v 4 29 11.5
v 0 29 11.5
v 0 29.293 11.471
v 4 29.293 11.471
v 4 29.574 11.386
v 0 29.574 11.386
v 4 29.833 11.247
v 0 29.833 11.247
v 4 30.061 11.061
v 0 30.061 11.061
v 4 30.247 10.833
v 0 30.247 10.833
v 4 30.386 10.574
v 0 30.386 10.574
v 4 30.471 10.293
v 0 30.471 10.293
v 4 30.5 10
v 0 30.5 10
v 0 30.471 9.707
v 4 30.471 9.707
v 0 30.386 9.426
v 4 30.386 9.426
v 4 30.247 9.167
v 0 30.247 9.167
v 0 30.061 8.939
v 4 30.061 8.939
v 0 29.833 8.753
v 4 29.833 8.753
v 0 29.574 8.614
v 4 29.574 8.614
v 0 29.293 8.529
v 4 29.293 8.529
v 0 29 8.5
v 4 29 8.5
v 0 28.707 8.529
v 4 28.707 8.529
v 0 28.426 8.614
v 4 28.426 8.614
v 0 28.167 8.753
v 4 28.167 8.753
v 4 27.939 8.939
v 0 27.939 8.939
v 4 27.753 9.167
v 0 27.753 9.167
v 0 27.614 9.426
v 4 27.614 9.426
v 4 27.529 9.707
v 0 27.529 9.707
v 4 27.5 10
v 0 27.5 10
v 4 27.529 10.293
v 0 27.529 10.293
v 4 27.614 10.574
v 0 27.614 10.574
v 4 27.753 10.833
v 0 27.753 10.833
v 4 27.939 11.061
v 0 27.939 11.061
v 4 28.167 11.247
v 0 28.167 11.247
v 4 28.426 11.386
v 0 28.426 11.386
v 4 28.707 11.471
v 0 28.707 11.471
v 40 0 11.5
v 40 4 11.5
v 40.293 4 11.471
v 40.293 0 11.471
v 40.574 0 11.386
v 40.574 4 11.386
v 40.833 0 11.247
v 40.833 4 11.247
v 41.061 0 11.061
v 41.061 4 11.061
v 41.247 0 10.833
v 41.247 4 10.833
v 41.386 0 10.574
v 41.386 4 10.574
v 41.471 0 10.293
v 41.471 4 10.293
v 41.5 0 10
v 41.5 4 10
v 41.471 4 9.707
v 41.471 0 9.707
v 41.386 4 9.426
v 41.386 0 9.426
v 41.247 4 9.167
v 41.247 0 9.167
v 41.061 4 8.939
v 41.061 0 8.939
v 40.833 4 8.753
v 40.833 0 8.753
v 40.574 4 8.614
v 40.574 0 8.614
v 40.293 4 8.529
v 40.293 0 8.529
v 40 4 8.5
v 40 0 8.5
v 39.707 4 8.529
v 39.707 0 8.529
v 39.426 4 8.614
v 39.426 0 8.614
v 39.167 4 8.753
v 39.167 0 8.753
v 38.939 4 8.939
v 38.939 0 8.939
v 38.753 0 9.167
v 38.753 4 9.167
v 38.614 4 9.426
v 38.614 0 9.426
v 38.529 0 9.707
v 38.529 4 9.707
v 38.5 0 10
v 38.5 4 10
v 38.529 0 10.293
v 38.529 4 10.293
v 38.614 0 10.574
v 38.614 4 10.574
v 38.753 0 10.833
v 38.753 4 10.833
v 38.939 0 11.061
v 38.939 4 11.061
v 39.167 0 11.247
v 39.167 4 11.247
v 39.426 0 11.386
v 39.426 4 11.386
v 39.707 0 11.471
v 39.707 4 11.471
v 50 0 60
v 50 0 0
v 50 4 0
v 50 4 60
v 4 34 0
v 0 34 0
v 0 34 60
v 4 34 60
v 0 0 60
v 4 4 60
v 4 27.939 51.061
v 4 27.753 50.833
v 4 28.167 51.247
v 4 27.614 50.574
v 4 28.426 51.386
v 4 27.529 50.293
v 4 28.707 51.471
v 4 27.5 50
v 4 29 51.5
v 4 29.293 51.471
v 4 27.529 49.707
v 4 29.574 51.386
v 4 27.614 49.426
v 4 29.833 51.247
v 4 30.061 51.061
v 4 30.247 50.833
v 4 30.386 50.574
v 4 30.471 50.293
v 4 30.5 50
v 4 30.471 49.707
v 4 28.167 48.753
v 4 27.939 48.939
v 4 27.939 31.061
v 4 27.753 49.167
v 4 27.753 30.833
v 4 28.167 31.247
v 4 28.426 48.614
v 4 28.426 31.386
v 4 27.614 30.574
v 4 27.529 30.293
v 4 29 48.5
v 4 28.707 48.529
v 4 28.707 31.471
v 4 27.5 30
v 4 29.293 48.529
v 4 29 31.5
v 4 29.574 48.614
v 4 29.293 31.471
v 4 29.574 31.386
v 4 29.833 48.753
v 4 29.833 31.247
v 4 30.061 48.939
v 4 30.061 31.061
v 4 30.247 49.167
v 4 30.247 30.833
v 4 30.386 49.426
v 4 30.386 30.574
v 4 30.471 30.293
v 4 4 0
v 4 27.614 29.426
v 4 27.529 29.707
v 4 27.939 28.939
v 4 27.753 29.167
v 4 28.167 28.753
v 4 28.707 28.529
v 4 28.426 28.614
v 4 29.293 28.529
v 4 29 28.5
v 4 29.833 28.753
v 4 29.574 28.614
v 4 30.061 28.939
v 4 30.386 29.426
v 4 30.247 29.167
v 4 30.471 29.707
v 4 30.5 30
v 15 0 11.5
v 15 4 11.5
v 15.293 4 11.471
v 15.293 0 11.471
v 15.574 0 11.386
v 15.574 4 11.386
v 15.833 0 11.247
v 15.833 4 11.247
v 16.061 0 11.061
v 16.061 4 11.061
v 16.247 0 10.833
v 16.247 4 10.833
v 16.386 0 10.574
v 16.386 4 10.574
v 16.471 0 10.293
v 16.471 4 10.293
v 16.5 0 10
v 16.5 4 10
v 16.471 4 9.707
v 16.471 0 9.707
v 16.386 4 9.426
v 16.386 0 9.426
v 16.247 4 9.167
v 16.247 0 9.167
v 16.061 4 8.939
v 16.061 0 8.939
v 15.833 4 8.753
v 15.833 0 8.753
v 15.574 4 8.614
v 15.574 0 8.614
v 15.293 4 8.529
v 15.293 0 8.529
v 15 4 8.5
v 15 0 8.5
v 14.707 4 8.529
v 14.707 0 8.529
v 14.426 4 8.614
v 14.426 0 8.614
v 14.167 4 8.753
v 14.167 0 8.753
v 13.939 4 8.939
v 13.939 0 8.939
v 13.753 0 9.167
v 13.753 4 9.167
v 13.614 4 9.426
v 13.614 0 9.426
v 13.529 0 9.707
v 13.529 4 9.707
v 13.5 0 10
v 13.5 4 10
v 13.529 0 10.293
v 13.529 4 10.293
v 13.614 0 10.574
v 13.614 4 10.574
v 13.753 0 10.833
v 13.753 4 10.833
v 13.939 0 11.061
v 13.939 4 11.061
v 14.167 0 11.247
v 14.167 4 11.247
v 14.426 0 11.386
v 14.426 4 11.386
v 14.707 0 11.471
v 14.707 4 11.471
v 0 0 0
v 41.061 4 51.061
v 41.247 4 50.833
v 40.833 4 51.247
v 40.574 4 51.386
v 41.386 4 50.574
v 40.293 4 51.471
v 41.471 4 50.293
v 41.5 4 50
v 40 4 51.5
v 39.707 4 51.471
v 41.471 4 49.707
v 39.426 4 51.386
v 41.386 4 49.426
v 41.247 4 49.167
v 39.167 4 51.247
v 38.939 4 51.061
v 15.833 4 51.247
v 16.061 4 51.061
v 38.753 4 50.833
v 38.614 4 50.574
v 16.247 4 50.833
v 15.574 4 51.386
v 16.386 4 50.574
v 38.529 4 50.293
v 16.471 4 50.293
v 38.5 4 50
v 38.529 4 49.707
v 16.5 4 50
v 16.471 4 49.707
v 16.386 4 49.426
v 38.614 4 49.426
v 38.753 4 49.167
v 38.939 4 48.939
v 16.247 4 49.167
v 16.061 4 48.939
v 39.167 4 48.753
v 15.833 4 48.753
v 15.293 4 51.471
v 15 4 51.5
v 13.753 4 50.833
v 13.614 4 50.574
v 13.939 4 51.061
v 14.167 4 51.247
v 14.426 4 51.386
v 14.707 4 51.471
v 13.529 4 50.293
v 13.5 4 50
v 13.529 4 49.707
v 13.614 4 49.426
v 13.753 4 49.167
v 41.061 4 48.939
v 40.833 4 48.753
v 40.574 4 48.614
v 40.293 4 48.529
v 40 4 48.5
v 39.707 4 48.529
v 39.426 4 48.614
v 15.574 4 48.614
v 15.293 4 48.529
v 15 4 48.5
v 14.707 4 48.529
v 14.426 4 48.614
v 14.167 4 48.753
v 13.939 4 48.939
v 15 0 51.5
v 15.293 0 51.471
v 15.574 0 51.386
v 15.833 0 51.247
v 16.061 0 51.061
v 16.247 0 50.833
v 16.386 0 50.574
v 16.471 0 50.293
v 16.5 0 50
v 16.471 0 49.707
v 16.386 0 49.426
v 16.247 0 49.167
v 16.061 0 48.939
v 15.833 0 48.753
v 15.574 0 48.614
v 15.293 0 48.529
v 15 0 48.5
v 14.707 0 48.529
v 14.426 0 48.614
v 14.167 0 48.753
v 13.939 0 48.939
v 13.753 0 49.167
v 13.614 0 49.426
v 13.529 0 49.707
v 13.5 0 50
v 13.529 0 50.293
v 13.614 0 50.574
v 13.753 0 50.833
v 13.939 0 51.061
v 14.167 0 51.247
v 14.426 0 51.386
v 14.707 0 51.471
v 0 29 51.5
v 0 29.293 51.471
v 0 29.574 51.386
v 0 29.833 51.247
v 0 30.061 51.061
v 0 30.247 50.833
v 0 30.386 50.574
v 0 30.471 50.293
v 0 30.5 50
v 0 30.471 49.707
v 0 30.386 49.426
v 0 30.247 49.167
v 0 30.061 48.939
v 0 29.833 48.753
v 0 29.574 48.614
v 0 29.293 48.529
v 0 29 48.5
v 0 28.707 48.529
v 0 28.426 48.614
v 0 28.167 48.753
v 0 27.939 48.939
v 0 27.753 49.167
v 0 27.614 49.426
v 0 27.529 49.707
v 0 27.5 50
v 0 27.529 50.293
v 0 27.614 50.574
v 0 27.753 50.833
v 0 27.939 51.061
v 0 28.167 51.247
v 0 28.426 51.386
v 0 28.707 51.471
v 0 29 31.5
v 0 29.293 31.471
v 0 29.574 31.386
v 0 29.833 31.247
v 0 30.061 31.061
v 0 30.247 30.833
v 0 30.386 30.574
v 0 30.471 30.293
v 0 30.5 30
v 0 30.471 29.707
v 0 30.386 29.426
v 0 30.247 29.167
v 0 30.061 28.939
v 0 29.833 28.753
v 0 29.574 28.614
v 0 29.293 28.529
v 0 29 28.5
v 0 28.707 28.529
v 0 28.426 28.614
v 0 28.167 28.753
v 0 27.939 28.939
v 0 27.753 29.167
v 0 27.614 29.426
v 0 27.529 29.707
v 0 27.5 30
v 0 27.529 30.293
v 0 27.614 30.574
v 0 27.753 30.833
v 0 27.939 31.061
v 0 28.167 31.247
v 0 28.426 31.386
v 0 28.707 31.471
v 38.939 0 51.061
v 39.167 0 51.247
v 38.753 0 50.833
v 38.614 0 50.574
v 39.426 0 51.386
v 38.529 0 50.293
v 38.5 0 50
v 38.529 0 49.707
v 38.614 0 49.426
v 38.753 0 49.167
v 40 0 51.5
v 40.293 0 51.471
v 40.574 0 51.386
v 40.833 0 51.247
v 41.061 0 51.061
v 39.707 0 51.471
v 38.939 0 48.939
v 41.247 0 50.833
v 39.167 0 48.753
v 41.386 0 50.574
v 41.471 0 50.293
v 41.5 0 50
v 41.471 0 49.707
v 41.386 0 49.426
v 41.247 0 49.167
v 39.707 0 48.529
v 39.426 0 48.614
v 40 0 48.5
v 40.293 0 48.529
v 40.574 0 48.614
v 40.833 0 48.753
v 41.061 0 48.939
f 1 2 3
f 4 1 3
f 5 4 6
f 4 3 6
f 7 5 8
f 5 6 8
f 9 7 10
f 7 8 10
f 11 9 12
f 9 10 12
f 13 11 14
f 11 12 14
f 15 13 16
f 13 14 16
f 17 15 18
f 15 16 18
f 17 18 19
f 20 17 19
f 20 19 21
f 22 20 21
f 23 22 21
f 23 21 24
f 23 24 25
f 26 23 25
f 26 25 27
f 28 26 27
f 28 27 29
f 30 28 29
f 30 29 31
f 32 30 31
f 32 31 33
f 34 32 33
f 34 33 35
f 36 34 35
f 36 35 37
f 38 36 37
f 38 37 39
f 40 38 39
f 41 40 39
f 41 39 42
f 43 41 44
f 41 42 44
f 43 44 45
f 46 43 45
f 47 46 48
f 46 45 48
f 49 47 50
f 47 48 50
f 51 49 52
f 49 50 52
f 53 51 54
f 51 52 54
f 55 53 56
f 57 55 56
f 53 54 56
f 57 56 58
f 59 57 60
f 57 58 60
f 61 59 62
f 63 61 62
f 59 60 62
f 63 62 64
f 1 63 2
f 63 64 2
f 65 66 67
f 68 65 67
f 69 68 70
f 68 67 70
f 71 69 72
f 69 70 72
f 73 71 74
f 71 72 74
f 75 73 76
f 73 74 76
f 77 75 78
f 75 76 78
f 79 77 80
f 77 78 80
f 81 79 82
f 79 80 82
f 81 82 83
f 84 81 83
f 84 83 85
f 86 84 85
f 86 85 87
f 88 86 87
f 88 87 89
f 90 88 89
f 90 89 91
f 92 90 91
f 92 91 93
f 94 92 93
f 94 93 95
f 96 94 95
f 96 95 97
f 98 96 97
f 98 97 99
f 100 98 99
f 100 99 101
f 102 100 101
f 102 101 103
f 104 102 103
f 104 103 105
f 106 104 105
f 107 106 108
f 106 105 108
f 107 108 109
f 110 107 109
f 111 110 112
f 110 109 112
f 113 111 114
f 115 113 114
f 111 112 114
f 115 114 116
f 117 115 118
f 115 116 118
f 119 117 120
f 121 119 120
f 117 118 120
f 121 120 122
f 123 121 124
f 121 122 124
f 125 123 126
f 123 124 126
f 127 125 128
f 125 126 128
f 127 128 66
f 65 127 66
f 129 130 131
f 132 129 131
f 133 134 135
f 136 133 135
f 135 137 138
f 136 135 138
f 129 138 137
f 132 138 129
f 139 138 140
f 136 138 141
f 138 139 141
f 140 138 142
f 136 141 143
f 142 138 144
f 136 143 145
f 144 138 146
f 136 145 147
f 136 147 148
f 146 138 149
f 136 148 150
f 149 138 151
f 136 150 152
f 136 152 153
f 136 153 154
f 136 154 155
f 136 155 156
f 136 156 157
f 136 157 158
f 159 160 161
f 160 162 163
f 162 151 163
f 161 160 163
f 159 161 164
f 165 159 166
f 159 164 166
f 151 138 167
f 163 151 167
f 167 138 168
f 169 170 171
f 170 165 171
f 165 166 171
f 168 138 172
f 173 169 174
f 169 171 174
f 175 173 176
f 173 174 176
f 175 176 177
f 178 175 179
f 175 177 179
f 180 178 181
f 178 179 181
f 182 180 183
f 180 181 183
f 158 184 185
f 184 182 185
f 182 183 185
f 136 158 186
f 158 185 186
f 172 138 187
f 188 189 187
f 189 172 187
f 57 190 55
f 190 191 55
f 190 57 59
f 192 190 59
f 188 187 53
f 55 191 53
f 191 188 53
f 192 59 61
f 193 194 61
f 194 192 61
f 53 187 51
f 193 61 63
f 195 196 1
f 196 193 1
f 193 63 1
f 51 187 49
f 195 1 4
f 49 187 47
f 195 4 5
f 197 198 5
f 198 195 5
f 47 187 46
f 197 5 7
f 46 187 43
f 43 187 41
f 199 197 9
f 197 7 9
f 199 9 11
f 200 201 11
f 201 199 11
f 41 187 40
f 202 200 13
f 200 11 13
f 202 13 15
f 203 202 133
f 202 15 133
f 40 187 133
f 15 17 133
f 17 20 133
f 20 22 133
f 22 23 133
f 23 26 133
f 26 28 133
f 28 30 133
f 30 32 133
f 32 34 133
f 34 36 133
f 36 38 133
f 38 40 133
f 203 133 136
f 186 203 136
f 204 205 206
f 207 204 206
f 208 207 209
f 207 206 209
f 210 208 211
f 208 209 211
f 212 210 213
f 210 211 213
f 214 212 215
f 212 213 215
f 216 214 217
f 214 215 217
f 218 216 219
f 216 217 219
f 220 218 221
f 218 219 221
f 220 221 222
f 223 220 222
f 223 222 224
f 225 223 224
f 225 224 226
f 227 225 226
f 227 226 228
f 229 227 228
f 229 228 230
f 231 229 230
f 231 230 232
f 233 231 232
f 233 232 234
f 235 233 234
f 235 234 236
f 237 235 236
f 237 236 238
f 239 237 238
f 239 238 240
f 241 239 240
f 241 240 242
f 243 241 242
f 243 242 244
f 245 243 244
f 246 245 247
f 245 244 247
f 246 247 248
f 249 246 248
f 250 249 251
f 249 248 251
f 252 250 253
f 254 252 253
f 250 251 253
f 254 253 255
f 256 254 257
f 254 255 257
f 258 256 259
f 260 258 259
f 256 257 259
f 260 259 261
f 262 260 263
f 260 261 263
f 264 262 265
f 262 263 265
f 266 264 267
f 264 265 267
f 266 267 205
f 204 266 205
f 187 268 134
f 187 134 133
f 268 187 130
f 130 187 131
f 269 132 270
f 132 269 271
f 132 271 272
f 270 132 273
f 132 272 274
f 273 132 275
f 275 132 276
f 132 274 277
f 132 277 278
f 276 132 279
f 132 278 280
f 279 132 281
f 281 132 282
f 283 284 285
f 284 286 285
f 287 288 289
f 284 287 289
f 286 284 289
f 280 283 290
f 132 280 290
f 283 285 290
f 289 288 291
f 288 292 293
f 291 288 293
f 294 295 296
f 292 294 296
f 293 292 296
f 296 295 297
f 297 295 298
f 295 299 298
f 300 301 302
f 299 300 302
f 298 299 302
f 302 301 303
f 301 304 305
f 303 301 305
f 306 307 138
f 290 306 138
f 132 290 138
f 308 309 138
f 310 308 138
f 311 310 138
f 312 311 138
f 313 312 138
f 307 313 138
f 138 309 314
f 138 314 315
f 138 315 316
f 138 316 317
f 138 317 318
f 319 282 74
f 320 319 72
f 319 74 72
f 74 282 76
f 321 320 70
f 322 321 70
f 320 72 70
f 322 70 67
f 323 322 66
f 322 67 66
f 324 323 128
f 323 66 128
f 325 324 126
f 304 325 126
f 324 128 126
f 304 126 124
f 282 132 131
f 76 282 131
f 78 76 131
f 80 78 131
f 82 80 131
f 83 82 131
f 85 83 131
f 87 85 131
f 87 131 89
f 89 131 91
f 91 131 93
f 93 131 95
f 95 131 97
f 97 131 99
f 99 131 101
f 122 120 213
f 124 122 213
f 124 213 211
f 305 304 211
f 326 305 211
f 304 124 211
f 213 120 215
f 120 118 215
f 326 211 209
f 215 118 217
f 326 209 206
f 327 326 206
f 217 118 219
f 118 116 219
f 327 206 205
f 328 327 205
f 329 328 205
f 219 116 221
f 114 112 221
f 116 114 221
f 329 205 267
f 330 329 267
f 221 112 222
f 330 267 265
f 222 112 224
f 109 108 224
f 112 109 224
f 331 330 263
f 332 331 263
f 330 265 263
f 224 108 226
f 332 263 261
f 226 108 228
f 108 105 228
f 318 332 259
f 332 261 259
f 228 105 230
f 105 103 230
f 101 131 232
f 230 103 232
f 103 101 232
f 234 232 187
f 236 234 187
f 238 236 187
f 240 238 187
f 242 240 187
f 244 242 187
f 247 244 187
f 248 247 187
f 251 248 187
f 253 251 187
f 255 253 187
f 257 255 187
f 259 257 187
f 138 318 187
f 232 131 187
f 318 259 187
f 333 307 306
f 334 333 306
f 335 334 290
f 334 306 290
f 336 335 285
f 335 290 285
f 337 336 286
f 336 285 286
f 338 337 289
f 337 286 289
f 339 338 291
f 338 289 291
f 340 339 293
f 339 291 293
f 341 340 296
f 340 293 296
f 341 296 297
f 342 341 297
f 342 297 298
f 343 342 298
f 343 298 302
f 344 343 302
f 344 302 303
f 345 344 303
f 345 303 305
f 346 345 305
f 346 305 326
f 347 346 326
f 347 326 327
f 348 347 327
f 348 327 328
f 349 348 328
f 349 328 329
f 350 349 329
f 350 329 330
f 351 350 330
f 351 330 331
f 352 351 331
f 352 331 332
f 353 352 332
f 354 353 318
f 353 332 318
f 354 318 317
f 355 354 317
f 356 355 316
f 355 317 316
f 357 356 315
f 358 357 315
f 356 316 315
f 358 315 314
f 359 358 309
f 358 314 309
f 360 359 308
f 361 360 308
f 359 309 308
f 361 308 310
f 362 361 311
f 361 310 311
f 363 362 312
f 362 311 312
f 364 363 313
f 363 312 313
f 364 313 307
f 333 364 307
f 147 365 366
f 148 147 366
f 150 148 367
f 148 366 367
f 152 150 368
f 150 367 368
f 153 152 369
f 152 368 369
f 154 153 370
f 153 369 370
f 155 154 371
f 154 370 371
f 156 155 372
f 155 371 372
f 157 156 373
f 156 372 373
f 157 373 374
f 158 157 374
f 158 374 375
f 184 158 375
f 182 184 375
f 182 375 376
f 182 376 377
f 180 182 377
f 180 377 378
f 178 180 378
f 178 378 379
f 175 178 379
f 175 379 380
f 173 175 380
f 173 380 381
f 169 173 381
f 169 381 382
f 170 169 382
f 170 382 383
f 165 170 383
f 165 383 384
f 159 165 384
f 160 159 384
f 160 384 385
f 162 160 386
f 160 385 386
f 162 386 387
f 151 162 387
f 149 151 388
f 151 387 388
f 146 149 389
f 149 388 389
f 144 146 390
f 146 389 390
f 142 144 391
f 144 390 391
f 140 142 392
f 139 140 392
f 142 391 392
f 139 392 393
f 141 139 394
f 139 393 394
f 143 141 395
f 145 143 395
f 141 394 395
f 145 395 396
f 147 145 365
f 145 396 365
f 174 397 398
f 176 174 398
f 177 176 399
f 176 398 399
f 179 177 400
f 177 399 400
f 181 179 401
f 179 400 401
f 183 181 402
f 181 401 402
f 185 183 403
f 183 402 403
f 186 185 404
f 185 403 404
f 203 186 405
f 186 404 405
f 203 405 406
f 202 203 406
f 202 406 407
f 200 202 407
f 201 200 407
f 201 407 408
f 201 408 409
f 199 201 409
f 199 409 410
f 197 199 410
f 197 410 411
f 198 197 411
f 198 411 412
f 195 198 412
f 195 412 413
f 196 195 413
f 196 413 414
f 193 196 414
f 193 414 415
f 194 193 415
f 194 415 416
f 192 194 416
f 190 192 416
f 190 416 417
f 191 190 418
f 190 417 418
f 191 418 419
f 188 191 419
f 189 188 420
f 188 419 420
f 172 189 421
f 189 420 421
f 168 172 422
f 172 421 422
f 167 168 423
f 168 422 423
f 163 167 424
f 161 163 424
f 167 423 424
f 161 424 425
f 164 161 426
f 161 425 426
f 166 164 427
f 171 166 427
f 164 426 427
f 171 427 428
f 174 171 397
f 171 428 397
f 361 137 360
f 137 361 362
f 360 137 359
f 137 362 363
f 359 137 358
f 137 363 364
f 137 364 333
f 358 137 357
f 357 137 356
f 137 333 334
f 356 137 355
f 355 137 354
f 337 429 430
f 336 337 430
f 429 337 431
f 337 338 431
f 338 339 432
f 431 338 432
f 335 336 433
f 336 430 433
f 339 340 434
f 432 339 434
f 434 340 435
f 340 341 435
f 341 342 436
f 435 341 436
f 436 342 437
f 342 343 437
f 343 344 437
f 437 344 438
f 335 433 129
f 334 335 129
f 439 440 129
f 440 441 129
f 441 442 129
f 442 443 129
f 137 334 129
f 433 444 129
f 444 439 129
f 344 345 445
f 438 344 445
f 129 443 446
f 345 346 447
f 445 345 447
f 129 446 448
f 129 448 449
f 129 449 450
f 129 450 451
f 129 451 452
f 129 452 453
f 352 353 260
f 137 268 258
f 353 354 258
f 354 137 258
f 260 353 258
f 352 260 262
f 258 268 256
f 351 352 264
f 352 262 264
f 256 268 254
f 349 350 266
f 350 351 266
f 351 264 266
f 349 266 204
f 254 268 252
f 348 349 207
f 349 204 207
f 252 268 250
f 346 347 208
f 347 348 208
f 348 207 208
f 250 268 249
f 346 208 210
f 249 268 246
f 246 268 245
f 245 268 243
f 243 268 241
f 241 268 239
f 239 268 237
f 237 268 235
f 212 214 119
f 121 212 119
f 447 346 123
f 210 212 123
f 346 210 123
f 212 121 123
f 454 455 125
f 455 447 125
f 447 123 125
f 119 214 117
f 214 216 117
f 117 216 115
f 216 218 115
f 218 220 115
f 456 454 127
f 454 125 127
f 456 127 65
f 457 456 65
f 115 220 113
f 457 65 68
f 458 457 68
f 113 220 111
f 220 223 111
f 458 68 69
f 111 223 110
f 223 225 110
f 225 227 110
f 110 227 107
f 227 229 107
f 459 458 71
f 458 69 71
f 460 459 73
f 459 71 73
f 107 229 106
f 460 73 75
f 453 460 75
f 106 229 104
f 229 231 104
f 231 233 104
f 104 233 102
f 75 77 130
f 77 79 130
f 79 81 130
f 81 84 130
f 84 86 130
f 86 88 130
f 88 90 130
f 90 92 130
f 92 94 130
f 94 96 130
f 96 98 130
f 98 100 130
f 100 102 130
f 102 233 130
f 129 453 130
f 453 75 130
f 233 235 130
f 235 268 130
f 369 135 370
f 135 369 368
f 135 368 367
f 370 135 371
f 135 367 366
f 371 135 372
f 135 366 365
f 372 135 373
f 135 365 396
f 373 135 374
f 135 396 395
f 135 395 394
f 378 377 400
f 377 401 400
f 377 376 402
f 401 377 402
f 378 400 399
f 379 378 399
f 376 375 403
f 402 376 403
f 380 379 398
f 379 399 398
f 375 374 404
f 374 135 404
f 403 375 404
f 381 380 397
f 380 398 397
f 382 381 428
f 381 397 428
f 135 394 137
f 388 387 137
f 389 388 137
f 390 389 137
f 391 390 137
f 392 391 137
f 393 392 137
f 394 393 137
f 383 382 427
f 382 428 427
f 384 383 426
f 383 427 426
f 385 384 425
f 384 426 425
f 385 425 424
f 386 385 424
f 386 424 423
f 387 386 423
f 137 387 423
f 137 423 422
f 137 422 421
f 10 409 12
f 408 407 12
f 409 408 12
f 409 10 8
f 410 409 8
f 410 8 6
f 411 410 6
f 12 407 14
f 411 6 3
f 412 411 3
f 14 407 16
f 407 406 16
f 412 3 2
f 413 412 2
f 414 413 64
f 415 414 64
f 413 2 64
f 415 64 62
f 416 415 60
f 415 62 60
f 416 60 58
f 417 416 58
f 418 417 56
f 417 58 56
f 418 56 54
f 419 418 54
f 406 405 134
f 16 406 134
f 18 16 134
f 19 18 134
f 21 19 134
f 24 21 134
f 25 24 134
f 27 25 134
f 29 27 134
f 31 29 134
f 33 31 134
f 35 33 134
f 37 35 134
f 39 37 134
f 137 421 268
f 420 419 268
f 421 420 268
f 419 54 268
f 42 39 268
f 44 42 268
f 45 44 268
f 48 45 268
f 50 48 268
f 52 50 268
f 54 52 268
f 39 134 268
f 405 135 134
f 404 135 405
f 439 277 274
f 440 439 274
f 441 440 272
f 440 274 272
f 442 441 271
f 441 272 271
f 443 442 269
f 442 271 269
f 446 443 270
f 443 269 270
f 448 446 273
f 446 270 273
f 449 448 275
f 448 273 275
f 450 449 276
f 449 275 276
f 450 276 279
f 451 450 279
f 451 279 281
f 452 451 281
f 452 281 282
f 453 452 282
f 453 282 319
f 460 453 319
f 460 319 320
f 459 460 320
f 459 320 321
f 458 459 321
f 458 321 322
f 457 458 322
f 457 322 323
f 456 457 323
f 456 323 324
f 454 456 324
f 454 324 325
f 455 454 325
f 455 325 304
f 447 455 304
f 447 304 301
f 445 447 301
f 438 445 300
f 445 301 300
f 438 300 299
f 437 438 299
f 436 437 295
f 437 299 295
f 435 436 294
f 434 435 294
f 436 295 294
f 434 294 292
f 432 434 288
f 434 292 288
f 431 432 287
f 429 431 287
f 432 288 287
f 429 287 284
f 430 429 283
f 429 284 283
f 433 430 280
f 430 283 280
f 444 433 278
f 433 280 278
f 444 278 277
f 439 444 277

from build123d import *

# Parameters (mm, degrees)
EXTRUSION1_DEPTH                = 60
ESQUISSE2_R                     = 1.5
EXTRUSION2_DEPTH                = 91.642153549
R_P_TITION_LIN_AIRE1_COUNT      = 2
R_P_TITION_LIN_AIRE1_PITCH      = 40
R_P_TITION_LIN_AIRE1_COUNT_DIR2 = 2
R_P_TITION_LIN_AIRE1_PITCH_DIR2 = 25
ESQUISSE3_W                     = 123.67499348
ESQUISSE3_H                     = 39.653502897
EXTRUSION3_DEPTH                = 10
ESQUISSE4_R                     = 1.5
EXTRUSION4_DEPTH                = 10
R_P_TITION_LIN_AIRE2_COUNT      = 3
R_P_TITION_LIN_AIRE2_PITCH      = 20


with BuildPart() as part:
    # Esquisse1 → Extrusion1 (new body)
    with BuildSketch(Plane.XY):
        Polygon((0, 0), (4, 0), (50, 0), (50, 4), (4, 4), (4, 50), (0, 50), align=None)
    extrude(amount=EXTRUSION1_DEPTH)

    # Esquisse2 → Extrusion2 (cut, through all)
    with BuildSketch(Plane(origin=(0, 4, 0), x_dir=(1, 0, 0), z_dir=(0, 1, 0))):
        with Locations(Location((40, -50, 0), (0, 0, 270))):
            Circle(ESQUISSE2_R)
    extrusion2 = extrude(amount=-EXTRUSION2_DEPTH, mode=Mode.SUBTRACT)

    # Répétition linéaire1: Extrusion2 2 × 2
    with Locations(*[(-j * R_P_TITION_LIN_AIRE1_PITCH_DIR2, 0, -i * R_P_TITION_LIN_AIRE1_PITCH) for i in range(R_P_TITION_LIN_AIRE1_COUNT) for j in range(R_P_TITION_LIN_AIRE1_COUNT_DIR2) if (i, j) != (0, 0)]):
        add(extrusion2, mode=Mode.SUBTRACT)

    # Esquisse3 → Extrusion3 (cut)
    with BuildSketch(Plane.ZY):
        with Locations((37.763783115, 53.826751449)):
            Rectangle(ESQUISSE3_W, ESQUISSE3_H)
    extrude(amount=-EXTRUSION3_DEPTH, mode=Mode.SUBTRACT)

    # Esquisse4 → Extrusion4 (cut)
    with BuildSketch(Plane.ZY):
        with Locations((50, 29)):
            Circle(ESQUISSE4_R)
    extrusion4 = extrude(amount=-EXTRUSION4_DEPTH, mode=Mode.SUBTRACT)

    # Répétition linéaire2: Extrusion4 ×3
    with Locations(*[(0, 0, -i * R_P_TITION_LIN_AIRE2_PITCH) for i in range(1, R_P_TITION_LIN_AIRE2_COUNT)]):
        add(extrusion4, mode=Mode.SUBTRACT)


solid = part.part
